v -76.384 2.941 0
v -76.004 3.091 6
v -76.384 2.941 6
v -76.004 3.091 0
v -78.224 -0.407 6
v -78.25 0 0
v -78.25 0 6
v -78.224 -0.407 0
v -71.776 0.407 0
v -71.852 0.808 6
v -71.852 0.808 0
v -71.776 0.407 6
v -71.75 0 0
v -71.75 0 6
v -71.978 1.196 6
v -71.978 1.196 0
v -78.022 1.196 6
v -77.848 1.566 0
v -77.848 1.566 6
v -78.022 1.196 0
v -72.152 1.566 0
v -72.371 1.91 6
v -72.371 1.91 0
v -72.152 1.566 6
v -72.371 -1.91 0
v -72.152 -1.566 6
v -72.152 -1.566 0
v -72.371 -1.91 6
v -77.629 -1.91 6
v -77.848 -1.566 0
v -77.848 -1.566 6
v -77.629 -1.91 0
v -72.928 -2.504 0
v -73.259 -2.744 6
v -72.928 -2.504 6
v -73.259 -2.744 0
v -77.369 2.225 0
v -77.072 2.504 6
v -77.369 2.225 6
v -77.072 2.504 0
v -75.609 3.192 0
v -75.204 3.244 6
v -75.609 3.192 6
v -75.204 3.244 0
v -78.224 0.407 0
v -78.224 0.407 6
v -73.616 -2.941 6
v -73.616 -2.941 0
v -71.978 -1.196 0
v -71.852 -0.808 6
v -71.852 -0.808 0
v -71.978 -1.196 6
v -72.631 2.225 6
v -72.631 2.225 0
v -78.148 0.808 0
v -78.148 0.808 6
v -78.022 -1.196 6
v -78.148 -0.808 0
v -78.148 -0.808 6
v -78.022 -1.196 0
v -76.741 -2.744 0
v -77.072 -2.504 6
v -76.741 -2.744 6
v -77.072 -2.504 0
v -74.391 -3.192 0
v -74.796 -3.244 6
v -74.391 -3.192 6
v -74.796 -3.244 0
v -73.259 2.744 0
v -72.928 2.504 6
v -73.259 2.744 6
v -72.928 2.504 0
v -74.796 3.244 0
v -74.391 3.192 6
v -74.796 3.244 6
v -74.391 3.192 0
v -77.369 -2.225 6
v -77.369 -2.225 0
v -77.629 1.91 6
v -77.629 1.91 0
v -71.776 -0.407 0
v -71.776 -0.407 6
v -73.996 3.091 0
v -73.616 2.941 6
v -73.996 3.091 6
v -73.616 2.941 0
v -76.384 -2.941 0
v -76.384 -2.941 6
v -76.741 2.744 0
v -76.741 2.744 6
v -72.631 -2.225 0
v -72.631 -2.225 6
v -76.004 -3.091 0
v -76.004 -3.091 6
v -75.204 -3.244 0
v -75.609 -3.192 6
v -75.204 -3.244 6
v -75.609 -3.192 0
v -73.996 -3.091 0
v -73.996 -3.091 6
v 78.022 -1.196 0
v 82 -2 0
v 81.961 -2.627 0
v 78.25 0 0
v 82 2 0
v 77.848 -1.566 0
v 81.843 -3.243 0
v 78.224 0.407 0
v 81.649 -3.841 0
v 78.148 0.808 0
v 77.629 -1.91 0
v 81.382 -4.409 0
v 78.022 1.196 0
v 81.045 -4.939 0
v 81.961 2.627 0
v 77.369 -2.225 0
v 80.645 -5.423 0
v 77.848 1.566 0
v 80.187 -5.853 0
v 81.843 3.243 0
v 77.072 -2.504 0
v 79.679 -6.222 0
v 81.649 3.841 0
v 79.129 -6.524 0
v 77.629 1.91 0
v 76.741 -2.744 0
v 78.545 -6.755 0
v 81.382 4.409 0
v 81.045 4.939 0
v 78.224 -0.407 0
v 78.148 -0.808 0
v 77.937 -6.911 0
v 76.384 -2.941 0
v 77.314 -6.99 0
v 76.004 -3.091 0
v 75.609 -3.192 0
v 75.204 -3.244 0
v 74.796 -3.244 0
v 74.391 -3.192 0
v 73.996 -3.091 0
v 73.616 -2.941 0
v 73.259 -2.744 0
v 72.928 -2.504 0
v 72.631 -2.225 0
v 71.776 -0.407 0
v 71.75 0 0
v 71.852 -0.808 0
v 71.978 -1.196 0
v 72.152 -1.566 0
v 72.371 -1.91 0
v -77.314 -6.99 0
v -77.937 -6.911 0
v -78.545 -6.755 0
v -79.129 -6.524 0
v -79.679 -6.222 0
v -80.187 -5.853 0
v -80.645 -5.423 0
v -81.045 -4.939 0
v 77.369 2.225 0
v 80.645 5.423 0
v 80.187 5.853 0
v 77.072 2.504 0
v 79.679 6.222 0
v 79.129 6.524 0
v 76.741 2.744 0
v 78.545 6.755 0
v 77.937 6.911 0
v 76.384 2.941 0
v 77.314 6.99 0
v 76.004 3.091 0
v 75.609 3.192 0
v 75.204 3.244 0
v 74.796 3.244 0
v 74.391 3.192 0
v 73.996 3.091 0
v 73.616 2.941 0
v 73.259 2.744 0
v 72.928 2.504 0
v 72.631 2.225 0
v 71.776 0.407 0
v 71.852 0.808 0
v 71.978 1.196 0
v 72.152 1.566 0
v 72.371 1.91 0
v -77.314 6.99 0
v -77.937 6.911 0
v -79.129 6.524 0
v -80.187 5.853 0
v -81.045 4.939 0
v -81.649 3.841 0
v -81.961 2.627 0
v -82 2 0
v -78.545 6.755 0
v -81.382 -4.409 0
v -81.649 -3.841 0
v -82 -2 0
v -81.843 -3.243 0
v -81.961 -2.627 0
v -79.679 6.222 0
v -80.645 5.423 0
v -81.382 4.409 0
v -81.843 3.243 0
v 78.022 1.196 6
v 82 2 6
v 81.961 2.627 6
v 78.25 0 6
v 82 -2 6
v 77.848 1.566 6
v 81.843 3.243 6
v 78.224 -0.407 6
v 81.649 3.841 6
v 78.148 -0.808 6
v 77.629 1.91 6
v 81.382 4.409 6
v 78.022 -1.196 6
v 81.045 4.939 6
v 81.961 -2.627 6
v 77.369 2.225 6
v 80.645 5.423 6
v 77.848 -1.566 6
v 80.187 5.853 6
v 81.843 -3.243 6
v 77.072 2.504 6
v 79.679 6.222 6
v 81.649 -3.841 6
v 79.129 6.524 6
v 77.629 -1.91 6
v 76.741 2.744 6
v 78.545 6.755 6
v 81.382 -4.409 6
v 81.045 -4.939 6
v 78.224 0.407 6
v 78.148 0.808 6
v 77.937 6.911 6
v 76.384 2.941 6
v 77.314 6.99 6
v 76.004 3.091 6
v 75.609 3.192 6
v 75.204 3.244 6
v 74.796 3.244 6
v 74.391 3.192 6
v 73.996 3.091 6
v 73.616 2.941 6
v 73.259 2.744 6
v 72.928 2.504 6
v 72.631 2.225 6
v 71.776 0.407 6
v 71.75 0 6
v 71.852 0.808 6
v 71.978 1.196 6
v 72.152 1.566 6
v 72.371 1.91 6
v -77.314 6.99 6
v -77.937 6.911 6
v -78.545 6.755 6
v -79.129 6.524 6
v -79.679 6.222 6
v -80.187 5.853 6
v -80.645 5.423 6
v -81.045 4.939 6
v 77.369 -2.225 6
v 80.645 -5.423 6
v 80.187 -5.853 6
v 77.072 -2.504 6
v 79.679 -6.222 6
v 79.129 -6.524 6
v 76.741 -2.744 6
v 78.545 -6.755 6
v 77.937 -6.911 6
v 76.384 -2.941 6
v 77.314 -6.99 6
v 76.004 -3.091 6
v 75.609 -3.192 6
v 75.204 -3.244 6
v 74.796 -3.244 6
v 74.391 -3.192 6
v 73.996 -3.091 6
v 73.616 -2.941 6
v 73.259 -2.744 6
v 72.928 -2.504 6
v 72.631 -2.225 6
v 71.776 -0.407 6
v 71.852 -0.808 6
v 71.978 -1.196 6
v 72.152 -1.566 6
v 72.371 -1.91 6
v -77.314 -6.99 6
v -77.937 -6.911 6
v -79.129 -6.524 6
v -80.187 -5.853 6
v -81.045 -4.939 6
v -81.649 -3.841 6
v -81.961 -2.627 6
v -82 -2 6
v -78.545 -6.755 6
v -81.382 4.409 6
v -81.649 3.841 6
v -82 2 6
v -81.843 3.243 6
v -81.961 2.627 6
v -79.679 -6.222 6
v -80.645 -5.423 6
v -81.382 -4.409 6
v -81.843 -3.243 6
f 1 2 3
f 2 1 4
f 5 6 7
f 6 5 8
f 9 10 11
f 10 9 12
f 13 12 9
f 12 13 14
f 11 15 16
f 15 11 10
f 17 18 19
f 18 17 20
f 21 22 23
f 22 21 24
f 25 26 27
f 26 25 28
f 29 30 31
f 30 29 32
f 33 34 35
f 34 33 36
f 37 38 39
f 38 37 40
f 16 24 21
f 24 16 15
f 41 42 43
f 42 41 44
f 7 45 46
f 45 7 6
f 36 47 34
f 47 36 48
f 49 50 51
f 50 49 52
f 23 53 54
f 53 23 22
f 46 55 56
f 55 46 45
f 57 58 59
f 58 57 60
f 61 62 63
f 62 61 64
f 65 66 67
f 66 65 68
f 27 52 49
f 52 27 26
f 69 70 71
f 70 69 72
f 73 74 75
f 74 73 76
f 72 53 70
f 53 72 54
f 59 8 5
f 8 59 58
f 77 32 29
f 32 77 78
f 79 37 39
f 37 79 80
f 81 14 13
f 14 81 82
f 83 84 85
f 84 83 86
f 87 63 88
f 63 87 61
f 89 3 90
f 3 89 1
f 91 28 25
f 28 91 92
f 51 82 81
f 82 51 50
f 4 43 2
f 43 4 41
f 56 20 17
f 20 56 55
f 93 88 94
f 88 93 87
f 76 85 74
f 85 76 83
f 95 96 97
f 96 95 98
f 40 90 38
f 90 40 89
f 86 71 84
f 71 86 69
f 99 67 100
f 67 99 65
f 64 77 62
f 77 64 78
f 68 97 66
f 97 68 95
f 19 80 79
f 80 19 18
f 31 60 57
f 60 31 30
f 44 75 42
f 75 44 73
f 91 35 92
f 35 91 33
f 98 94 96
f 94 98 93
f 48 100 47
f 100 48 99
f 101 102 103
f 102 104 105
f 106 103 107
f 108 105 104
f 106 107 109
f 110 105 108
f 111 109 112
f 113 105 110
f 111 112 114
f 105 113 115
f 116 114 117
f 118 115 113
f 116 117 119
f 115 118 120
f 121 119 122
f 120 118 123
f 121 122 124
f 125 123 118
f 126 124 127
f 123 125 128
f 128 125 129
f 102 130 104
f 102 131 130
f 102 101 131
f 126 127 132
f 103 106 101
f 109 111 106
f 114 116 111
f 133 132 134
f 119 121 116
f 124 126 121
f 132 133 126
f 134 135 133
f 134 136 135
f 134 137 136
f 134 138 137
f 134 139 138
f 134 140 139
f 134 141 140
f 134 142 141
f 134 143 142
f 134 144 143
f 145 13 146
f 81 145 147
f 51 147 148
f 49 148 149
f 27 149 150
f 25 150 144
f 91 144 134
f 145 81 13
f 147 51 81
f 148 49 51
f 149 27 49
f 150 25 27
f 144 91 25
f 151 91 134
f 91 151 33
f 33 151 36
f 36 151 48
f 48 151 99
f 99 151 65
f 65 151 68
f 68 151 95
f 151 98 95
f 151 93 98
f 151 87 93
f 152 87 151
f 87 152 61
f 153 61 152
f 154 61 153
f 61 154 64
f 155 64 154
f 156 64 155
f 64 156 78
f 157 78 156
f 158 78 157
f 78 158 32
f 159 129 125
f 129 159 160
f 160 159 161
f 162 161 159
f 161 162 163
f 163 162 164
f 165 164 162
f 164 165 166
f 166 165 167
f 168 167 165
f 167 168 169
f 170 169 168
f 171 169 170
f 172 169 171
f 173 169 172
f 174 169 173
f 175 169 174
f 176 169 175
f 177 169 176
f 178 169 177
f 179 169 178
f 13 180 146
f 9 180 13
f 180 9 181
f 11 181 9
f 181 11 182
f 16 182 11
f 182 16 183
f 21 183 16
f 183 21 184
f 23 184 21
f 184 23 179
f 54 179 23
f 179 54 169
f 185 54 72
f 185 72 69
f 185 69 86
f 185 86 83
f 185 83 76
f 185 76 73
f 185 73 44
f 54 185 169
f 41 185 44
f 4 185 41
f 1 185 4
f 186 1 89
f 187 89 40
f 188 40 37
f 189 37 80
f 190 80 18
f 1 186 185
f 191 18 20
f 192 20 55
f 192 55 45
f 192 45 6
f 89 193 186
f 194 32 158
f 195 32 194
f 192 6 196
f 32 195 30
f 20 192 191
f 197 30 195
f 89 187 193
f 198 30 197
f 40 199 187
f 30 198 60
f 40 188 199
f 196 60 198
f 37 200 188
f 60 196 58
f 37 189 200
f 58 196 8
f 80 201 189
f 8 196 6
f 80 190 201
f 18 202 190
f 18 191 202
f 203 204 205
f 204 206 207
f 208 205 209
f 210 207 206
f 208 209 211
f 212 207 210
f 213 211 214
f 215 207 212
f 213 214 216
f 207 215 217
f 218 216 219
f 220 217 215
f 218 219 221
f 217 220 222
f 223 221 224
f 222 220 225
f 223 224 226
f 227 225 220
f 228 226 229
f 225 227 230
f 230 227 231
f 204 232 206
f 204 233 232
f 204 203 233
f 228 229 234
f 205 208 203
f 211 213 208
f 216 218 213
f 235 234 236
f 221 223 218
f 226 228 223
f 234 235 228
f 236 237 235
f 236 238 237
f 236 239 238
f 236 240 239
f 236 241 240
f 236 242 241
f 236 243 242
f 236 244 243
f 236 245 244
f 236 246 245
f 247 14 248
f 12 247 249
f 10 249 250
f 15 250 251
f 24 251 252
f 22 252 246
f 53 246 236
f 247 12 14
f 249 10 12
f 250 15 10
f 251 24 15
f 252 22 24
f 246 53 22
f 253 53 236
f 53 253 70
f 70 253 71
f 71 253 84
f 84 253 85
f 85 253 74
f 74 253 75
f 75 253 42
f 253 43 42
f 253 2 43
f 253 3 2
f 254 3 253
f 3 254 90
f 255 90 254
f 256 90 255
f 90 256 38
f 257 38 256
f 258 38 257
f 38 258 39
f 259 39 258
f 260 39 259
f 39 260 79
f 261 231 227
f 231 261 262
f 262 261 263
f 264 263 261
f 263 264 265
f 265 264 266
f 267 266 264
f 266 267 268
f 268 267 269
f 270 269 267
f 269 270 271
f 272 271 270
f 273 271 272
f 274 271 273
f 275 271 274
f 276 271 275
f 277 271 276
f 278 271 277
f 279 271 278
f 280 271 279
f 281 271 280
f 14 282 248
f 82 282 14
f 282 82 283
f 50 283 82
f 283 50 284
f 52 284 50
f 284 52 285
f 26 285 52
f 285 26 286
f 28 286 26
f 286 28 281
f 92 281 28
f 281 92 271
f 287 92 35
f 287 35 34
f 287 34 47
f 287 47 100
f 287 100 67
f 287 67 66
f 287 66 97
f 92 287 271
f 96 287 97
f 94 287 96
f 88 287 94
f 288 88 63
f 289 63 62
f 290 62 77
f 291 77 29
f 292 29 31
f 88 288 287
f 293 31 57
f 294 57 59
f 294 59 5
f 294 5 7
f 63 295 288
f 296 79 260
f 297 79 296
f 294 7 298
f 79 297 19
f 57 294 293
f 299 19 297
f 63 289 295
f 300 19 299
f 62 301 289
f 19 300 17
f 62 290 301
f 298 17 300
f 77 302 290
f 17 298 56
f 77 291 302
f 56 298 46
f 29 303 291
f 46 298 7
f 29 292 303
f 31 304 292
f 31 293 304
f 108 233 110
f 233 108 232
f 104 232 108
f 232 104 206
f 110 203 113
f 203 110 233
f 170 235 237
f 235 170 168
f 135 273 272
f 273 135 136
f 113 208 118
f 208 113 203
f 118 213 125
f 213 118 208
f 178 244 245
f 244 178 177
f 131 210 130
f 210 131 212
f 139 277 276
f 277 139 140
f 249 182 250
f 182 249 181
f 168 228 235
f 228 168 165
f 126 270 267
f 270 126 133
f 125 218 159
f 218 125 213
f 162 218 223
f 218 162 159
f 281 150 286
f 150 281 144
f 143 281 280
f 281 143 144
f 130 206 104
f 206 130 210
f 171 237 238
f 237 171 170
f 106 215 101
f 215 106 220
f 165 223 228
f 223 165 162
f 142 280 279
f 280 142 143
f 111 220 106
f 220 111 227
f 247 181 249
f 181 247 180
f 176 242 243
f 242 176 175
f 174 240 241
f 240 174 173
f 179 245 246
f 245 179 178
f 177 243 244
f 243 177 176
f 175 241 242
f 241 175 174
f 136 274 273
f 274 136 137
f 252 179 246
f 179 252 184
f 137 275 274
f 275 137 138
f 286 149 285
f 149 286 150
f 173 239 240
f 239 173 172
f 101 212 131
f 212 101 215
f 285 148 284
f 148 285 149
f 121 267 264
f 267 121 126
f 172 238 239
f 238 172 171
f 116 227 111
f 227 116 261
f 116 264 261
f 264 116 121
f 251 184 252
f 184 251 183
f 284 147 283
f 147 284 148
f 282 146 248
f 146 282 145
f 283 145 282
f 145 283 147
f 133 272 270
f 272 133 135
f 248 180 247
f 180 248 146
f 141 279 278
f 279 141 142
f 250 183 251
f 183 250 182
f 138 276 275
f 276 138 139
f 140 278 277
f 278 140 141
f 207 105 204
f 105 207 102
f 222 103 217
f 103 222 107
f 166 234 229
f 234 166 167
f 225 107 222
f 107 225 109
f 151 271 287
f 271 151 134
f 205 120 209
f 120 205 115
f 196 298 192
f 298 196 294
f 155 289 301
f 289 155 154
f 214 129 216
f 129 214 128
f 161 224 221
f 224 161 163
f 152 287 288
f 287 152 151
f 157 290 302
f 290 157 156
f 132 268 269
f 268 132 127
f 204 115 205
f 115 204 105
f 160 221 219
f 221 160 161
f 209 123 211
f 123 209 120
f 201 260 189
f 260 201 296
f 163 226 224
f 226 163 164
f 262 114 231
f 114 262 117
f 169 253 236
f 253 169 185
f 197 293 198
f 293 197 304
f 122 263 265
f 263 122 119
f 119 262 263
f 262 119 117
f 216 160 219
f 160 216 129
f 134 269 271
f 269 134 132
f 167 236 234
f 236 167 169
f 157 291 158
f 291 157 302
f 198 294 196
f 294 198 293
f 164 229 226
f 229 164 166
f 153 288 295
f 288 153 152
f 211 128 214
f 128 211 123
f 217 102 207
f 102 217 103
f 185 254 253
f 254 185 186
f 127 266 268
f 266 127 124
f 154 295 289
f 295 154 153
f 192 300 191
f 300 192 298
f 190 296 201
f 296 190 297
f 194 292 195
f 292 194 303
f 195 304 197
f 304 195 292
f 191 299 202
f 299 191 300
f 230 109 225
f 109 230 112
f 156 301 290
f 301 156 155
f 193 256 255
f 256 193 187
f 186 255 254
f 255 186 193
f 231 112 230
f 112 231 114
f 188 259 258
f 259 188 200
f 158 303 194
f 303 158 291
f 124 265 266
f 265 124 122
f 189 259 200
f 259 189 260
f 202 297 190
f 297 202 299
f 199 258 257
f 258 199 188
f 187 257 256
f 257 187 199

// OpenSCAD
$fn = 50;


difference() {
	union() {
		hull() {
			translate(v = [-77.0000000000, 2.0000000000, 0]) {
				cylinder(h = 6, r = 5);
			}
			translate(v = [77.0000000000, 2.0000000000, 0]) {
				cylinder(h = 6, r = 5);
			}
			translate(v = [-77.0000000000, -2.0000000000, 0]) {
				cylinder(h = 6, r = 5);
			}
			translate(v = [77.0000000000, -2.0000000000, 0]) {
				cylinder(h = 6, r = 5);
			}
		}
	}
	union() {
		translate(v = [-75.0000000000, 0.0000000000, 0]) {
			cylinder(h = 6, r = 3.2500000000);
		}
		translate(v = [75.0000000000, 0.0000000000, 0]) {
			cylinder(h = 6, r = 3.2500000000);
		}
		translate(v = [-75.0000000000, 0.0000000000, 0]) {
			cylinder(h = 6, r = 1.8000000000);
		}
		translate(v = [75.0000000000, 0.0000000000, 0]) {
			cylinder(h = 6, r = 1.8000000000);
		}
		translate(v = [-75.0000000000, 0.0000000000, 0]) {
			cylinder(h = 6, r = 1.8000000000);
		}
		translate(v = [75.0000000000, 0.0000000000, 0]) {
			cylinder(h = 6, r = 1.8000000000);
		}
		translate(v = [-75.0000000000, 0.0000000000, 0]) {
			cylinder(h = 6, r = 1.8000000000);
		}
		translate(v = [75.0000000000, 0.0000000000, 0]) {
			cylinder(h = 6, r = 1.8000000000);
		}
	}
}
